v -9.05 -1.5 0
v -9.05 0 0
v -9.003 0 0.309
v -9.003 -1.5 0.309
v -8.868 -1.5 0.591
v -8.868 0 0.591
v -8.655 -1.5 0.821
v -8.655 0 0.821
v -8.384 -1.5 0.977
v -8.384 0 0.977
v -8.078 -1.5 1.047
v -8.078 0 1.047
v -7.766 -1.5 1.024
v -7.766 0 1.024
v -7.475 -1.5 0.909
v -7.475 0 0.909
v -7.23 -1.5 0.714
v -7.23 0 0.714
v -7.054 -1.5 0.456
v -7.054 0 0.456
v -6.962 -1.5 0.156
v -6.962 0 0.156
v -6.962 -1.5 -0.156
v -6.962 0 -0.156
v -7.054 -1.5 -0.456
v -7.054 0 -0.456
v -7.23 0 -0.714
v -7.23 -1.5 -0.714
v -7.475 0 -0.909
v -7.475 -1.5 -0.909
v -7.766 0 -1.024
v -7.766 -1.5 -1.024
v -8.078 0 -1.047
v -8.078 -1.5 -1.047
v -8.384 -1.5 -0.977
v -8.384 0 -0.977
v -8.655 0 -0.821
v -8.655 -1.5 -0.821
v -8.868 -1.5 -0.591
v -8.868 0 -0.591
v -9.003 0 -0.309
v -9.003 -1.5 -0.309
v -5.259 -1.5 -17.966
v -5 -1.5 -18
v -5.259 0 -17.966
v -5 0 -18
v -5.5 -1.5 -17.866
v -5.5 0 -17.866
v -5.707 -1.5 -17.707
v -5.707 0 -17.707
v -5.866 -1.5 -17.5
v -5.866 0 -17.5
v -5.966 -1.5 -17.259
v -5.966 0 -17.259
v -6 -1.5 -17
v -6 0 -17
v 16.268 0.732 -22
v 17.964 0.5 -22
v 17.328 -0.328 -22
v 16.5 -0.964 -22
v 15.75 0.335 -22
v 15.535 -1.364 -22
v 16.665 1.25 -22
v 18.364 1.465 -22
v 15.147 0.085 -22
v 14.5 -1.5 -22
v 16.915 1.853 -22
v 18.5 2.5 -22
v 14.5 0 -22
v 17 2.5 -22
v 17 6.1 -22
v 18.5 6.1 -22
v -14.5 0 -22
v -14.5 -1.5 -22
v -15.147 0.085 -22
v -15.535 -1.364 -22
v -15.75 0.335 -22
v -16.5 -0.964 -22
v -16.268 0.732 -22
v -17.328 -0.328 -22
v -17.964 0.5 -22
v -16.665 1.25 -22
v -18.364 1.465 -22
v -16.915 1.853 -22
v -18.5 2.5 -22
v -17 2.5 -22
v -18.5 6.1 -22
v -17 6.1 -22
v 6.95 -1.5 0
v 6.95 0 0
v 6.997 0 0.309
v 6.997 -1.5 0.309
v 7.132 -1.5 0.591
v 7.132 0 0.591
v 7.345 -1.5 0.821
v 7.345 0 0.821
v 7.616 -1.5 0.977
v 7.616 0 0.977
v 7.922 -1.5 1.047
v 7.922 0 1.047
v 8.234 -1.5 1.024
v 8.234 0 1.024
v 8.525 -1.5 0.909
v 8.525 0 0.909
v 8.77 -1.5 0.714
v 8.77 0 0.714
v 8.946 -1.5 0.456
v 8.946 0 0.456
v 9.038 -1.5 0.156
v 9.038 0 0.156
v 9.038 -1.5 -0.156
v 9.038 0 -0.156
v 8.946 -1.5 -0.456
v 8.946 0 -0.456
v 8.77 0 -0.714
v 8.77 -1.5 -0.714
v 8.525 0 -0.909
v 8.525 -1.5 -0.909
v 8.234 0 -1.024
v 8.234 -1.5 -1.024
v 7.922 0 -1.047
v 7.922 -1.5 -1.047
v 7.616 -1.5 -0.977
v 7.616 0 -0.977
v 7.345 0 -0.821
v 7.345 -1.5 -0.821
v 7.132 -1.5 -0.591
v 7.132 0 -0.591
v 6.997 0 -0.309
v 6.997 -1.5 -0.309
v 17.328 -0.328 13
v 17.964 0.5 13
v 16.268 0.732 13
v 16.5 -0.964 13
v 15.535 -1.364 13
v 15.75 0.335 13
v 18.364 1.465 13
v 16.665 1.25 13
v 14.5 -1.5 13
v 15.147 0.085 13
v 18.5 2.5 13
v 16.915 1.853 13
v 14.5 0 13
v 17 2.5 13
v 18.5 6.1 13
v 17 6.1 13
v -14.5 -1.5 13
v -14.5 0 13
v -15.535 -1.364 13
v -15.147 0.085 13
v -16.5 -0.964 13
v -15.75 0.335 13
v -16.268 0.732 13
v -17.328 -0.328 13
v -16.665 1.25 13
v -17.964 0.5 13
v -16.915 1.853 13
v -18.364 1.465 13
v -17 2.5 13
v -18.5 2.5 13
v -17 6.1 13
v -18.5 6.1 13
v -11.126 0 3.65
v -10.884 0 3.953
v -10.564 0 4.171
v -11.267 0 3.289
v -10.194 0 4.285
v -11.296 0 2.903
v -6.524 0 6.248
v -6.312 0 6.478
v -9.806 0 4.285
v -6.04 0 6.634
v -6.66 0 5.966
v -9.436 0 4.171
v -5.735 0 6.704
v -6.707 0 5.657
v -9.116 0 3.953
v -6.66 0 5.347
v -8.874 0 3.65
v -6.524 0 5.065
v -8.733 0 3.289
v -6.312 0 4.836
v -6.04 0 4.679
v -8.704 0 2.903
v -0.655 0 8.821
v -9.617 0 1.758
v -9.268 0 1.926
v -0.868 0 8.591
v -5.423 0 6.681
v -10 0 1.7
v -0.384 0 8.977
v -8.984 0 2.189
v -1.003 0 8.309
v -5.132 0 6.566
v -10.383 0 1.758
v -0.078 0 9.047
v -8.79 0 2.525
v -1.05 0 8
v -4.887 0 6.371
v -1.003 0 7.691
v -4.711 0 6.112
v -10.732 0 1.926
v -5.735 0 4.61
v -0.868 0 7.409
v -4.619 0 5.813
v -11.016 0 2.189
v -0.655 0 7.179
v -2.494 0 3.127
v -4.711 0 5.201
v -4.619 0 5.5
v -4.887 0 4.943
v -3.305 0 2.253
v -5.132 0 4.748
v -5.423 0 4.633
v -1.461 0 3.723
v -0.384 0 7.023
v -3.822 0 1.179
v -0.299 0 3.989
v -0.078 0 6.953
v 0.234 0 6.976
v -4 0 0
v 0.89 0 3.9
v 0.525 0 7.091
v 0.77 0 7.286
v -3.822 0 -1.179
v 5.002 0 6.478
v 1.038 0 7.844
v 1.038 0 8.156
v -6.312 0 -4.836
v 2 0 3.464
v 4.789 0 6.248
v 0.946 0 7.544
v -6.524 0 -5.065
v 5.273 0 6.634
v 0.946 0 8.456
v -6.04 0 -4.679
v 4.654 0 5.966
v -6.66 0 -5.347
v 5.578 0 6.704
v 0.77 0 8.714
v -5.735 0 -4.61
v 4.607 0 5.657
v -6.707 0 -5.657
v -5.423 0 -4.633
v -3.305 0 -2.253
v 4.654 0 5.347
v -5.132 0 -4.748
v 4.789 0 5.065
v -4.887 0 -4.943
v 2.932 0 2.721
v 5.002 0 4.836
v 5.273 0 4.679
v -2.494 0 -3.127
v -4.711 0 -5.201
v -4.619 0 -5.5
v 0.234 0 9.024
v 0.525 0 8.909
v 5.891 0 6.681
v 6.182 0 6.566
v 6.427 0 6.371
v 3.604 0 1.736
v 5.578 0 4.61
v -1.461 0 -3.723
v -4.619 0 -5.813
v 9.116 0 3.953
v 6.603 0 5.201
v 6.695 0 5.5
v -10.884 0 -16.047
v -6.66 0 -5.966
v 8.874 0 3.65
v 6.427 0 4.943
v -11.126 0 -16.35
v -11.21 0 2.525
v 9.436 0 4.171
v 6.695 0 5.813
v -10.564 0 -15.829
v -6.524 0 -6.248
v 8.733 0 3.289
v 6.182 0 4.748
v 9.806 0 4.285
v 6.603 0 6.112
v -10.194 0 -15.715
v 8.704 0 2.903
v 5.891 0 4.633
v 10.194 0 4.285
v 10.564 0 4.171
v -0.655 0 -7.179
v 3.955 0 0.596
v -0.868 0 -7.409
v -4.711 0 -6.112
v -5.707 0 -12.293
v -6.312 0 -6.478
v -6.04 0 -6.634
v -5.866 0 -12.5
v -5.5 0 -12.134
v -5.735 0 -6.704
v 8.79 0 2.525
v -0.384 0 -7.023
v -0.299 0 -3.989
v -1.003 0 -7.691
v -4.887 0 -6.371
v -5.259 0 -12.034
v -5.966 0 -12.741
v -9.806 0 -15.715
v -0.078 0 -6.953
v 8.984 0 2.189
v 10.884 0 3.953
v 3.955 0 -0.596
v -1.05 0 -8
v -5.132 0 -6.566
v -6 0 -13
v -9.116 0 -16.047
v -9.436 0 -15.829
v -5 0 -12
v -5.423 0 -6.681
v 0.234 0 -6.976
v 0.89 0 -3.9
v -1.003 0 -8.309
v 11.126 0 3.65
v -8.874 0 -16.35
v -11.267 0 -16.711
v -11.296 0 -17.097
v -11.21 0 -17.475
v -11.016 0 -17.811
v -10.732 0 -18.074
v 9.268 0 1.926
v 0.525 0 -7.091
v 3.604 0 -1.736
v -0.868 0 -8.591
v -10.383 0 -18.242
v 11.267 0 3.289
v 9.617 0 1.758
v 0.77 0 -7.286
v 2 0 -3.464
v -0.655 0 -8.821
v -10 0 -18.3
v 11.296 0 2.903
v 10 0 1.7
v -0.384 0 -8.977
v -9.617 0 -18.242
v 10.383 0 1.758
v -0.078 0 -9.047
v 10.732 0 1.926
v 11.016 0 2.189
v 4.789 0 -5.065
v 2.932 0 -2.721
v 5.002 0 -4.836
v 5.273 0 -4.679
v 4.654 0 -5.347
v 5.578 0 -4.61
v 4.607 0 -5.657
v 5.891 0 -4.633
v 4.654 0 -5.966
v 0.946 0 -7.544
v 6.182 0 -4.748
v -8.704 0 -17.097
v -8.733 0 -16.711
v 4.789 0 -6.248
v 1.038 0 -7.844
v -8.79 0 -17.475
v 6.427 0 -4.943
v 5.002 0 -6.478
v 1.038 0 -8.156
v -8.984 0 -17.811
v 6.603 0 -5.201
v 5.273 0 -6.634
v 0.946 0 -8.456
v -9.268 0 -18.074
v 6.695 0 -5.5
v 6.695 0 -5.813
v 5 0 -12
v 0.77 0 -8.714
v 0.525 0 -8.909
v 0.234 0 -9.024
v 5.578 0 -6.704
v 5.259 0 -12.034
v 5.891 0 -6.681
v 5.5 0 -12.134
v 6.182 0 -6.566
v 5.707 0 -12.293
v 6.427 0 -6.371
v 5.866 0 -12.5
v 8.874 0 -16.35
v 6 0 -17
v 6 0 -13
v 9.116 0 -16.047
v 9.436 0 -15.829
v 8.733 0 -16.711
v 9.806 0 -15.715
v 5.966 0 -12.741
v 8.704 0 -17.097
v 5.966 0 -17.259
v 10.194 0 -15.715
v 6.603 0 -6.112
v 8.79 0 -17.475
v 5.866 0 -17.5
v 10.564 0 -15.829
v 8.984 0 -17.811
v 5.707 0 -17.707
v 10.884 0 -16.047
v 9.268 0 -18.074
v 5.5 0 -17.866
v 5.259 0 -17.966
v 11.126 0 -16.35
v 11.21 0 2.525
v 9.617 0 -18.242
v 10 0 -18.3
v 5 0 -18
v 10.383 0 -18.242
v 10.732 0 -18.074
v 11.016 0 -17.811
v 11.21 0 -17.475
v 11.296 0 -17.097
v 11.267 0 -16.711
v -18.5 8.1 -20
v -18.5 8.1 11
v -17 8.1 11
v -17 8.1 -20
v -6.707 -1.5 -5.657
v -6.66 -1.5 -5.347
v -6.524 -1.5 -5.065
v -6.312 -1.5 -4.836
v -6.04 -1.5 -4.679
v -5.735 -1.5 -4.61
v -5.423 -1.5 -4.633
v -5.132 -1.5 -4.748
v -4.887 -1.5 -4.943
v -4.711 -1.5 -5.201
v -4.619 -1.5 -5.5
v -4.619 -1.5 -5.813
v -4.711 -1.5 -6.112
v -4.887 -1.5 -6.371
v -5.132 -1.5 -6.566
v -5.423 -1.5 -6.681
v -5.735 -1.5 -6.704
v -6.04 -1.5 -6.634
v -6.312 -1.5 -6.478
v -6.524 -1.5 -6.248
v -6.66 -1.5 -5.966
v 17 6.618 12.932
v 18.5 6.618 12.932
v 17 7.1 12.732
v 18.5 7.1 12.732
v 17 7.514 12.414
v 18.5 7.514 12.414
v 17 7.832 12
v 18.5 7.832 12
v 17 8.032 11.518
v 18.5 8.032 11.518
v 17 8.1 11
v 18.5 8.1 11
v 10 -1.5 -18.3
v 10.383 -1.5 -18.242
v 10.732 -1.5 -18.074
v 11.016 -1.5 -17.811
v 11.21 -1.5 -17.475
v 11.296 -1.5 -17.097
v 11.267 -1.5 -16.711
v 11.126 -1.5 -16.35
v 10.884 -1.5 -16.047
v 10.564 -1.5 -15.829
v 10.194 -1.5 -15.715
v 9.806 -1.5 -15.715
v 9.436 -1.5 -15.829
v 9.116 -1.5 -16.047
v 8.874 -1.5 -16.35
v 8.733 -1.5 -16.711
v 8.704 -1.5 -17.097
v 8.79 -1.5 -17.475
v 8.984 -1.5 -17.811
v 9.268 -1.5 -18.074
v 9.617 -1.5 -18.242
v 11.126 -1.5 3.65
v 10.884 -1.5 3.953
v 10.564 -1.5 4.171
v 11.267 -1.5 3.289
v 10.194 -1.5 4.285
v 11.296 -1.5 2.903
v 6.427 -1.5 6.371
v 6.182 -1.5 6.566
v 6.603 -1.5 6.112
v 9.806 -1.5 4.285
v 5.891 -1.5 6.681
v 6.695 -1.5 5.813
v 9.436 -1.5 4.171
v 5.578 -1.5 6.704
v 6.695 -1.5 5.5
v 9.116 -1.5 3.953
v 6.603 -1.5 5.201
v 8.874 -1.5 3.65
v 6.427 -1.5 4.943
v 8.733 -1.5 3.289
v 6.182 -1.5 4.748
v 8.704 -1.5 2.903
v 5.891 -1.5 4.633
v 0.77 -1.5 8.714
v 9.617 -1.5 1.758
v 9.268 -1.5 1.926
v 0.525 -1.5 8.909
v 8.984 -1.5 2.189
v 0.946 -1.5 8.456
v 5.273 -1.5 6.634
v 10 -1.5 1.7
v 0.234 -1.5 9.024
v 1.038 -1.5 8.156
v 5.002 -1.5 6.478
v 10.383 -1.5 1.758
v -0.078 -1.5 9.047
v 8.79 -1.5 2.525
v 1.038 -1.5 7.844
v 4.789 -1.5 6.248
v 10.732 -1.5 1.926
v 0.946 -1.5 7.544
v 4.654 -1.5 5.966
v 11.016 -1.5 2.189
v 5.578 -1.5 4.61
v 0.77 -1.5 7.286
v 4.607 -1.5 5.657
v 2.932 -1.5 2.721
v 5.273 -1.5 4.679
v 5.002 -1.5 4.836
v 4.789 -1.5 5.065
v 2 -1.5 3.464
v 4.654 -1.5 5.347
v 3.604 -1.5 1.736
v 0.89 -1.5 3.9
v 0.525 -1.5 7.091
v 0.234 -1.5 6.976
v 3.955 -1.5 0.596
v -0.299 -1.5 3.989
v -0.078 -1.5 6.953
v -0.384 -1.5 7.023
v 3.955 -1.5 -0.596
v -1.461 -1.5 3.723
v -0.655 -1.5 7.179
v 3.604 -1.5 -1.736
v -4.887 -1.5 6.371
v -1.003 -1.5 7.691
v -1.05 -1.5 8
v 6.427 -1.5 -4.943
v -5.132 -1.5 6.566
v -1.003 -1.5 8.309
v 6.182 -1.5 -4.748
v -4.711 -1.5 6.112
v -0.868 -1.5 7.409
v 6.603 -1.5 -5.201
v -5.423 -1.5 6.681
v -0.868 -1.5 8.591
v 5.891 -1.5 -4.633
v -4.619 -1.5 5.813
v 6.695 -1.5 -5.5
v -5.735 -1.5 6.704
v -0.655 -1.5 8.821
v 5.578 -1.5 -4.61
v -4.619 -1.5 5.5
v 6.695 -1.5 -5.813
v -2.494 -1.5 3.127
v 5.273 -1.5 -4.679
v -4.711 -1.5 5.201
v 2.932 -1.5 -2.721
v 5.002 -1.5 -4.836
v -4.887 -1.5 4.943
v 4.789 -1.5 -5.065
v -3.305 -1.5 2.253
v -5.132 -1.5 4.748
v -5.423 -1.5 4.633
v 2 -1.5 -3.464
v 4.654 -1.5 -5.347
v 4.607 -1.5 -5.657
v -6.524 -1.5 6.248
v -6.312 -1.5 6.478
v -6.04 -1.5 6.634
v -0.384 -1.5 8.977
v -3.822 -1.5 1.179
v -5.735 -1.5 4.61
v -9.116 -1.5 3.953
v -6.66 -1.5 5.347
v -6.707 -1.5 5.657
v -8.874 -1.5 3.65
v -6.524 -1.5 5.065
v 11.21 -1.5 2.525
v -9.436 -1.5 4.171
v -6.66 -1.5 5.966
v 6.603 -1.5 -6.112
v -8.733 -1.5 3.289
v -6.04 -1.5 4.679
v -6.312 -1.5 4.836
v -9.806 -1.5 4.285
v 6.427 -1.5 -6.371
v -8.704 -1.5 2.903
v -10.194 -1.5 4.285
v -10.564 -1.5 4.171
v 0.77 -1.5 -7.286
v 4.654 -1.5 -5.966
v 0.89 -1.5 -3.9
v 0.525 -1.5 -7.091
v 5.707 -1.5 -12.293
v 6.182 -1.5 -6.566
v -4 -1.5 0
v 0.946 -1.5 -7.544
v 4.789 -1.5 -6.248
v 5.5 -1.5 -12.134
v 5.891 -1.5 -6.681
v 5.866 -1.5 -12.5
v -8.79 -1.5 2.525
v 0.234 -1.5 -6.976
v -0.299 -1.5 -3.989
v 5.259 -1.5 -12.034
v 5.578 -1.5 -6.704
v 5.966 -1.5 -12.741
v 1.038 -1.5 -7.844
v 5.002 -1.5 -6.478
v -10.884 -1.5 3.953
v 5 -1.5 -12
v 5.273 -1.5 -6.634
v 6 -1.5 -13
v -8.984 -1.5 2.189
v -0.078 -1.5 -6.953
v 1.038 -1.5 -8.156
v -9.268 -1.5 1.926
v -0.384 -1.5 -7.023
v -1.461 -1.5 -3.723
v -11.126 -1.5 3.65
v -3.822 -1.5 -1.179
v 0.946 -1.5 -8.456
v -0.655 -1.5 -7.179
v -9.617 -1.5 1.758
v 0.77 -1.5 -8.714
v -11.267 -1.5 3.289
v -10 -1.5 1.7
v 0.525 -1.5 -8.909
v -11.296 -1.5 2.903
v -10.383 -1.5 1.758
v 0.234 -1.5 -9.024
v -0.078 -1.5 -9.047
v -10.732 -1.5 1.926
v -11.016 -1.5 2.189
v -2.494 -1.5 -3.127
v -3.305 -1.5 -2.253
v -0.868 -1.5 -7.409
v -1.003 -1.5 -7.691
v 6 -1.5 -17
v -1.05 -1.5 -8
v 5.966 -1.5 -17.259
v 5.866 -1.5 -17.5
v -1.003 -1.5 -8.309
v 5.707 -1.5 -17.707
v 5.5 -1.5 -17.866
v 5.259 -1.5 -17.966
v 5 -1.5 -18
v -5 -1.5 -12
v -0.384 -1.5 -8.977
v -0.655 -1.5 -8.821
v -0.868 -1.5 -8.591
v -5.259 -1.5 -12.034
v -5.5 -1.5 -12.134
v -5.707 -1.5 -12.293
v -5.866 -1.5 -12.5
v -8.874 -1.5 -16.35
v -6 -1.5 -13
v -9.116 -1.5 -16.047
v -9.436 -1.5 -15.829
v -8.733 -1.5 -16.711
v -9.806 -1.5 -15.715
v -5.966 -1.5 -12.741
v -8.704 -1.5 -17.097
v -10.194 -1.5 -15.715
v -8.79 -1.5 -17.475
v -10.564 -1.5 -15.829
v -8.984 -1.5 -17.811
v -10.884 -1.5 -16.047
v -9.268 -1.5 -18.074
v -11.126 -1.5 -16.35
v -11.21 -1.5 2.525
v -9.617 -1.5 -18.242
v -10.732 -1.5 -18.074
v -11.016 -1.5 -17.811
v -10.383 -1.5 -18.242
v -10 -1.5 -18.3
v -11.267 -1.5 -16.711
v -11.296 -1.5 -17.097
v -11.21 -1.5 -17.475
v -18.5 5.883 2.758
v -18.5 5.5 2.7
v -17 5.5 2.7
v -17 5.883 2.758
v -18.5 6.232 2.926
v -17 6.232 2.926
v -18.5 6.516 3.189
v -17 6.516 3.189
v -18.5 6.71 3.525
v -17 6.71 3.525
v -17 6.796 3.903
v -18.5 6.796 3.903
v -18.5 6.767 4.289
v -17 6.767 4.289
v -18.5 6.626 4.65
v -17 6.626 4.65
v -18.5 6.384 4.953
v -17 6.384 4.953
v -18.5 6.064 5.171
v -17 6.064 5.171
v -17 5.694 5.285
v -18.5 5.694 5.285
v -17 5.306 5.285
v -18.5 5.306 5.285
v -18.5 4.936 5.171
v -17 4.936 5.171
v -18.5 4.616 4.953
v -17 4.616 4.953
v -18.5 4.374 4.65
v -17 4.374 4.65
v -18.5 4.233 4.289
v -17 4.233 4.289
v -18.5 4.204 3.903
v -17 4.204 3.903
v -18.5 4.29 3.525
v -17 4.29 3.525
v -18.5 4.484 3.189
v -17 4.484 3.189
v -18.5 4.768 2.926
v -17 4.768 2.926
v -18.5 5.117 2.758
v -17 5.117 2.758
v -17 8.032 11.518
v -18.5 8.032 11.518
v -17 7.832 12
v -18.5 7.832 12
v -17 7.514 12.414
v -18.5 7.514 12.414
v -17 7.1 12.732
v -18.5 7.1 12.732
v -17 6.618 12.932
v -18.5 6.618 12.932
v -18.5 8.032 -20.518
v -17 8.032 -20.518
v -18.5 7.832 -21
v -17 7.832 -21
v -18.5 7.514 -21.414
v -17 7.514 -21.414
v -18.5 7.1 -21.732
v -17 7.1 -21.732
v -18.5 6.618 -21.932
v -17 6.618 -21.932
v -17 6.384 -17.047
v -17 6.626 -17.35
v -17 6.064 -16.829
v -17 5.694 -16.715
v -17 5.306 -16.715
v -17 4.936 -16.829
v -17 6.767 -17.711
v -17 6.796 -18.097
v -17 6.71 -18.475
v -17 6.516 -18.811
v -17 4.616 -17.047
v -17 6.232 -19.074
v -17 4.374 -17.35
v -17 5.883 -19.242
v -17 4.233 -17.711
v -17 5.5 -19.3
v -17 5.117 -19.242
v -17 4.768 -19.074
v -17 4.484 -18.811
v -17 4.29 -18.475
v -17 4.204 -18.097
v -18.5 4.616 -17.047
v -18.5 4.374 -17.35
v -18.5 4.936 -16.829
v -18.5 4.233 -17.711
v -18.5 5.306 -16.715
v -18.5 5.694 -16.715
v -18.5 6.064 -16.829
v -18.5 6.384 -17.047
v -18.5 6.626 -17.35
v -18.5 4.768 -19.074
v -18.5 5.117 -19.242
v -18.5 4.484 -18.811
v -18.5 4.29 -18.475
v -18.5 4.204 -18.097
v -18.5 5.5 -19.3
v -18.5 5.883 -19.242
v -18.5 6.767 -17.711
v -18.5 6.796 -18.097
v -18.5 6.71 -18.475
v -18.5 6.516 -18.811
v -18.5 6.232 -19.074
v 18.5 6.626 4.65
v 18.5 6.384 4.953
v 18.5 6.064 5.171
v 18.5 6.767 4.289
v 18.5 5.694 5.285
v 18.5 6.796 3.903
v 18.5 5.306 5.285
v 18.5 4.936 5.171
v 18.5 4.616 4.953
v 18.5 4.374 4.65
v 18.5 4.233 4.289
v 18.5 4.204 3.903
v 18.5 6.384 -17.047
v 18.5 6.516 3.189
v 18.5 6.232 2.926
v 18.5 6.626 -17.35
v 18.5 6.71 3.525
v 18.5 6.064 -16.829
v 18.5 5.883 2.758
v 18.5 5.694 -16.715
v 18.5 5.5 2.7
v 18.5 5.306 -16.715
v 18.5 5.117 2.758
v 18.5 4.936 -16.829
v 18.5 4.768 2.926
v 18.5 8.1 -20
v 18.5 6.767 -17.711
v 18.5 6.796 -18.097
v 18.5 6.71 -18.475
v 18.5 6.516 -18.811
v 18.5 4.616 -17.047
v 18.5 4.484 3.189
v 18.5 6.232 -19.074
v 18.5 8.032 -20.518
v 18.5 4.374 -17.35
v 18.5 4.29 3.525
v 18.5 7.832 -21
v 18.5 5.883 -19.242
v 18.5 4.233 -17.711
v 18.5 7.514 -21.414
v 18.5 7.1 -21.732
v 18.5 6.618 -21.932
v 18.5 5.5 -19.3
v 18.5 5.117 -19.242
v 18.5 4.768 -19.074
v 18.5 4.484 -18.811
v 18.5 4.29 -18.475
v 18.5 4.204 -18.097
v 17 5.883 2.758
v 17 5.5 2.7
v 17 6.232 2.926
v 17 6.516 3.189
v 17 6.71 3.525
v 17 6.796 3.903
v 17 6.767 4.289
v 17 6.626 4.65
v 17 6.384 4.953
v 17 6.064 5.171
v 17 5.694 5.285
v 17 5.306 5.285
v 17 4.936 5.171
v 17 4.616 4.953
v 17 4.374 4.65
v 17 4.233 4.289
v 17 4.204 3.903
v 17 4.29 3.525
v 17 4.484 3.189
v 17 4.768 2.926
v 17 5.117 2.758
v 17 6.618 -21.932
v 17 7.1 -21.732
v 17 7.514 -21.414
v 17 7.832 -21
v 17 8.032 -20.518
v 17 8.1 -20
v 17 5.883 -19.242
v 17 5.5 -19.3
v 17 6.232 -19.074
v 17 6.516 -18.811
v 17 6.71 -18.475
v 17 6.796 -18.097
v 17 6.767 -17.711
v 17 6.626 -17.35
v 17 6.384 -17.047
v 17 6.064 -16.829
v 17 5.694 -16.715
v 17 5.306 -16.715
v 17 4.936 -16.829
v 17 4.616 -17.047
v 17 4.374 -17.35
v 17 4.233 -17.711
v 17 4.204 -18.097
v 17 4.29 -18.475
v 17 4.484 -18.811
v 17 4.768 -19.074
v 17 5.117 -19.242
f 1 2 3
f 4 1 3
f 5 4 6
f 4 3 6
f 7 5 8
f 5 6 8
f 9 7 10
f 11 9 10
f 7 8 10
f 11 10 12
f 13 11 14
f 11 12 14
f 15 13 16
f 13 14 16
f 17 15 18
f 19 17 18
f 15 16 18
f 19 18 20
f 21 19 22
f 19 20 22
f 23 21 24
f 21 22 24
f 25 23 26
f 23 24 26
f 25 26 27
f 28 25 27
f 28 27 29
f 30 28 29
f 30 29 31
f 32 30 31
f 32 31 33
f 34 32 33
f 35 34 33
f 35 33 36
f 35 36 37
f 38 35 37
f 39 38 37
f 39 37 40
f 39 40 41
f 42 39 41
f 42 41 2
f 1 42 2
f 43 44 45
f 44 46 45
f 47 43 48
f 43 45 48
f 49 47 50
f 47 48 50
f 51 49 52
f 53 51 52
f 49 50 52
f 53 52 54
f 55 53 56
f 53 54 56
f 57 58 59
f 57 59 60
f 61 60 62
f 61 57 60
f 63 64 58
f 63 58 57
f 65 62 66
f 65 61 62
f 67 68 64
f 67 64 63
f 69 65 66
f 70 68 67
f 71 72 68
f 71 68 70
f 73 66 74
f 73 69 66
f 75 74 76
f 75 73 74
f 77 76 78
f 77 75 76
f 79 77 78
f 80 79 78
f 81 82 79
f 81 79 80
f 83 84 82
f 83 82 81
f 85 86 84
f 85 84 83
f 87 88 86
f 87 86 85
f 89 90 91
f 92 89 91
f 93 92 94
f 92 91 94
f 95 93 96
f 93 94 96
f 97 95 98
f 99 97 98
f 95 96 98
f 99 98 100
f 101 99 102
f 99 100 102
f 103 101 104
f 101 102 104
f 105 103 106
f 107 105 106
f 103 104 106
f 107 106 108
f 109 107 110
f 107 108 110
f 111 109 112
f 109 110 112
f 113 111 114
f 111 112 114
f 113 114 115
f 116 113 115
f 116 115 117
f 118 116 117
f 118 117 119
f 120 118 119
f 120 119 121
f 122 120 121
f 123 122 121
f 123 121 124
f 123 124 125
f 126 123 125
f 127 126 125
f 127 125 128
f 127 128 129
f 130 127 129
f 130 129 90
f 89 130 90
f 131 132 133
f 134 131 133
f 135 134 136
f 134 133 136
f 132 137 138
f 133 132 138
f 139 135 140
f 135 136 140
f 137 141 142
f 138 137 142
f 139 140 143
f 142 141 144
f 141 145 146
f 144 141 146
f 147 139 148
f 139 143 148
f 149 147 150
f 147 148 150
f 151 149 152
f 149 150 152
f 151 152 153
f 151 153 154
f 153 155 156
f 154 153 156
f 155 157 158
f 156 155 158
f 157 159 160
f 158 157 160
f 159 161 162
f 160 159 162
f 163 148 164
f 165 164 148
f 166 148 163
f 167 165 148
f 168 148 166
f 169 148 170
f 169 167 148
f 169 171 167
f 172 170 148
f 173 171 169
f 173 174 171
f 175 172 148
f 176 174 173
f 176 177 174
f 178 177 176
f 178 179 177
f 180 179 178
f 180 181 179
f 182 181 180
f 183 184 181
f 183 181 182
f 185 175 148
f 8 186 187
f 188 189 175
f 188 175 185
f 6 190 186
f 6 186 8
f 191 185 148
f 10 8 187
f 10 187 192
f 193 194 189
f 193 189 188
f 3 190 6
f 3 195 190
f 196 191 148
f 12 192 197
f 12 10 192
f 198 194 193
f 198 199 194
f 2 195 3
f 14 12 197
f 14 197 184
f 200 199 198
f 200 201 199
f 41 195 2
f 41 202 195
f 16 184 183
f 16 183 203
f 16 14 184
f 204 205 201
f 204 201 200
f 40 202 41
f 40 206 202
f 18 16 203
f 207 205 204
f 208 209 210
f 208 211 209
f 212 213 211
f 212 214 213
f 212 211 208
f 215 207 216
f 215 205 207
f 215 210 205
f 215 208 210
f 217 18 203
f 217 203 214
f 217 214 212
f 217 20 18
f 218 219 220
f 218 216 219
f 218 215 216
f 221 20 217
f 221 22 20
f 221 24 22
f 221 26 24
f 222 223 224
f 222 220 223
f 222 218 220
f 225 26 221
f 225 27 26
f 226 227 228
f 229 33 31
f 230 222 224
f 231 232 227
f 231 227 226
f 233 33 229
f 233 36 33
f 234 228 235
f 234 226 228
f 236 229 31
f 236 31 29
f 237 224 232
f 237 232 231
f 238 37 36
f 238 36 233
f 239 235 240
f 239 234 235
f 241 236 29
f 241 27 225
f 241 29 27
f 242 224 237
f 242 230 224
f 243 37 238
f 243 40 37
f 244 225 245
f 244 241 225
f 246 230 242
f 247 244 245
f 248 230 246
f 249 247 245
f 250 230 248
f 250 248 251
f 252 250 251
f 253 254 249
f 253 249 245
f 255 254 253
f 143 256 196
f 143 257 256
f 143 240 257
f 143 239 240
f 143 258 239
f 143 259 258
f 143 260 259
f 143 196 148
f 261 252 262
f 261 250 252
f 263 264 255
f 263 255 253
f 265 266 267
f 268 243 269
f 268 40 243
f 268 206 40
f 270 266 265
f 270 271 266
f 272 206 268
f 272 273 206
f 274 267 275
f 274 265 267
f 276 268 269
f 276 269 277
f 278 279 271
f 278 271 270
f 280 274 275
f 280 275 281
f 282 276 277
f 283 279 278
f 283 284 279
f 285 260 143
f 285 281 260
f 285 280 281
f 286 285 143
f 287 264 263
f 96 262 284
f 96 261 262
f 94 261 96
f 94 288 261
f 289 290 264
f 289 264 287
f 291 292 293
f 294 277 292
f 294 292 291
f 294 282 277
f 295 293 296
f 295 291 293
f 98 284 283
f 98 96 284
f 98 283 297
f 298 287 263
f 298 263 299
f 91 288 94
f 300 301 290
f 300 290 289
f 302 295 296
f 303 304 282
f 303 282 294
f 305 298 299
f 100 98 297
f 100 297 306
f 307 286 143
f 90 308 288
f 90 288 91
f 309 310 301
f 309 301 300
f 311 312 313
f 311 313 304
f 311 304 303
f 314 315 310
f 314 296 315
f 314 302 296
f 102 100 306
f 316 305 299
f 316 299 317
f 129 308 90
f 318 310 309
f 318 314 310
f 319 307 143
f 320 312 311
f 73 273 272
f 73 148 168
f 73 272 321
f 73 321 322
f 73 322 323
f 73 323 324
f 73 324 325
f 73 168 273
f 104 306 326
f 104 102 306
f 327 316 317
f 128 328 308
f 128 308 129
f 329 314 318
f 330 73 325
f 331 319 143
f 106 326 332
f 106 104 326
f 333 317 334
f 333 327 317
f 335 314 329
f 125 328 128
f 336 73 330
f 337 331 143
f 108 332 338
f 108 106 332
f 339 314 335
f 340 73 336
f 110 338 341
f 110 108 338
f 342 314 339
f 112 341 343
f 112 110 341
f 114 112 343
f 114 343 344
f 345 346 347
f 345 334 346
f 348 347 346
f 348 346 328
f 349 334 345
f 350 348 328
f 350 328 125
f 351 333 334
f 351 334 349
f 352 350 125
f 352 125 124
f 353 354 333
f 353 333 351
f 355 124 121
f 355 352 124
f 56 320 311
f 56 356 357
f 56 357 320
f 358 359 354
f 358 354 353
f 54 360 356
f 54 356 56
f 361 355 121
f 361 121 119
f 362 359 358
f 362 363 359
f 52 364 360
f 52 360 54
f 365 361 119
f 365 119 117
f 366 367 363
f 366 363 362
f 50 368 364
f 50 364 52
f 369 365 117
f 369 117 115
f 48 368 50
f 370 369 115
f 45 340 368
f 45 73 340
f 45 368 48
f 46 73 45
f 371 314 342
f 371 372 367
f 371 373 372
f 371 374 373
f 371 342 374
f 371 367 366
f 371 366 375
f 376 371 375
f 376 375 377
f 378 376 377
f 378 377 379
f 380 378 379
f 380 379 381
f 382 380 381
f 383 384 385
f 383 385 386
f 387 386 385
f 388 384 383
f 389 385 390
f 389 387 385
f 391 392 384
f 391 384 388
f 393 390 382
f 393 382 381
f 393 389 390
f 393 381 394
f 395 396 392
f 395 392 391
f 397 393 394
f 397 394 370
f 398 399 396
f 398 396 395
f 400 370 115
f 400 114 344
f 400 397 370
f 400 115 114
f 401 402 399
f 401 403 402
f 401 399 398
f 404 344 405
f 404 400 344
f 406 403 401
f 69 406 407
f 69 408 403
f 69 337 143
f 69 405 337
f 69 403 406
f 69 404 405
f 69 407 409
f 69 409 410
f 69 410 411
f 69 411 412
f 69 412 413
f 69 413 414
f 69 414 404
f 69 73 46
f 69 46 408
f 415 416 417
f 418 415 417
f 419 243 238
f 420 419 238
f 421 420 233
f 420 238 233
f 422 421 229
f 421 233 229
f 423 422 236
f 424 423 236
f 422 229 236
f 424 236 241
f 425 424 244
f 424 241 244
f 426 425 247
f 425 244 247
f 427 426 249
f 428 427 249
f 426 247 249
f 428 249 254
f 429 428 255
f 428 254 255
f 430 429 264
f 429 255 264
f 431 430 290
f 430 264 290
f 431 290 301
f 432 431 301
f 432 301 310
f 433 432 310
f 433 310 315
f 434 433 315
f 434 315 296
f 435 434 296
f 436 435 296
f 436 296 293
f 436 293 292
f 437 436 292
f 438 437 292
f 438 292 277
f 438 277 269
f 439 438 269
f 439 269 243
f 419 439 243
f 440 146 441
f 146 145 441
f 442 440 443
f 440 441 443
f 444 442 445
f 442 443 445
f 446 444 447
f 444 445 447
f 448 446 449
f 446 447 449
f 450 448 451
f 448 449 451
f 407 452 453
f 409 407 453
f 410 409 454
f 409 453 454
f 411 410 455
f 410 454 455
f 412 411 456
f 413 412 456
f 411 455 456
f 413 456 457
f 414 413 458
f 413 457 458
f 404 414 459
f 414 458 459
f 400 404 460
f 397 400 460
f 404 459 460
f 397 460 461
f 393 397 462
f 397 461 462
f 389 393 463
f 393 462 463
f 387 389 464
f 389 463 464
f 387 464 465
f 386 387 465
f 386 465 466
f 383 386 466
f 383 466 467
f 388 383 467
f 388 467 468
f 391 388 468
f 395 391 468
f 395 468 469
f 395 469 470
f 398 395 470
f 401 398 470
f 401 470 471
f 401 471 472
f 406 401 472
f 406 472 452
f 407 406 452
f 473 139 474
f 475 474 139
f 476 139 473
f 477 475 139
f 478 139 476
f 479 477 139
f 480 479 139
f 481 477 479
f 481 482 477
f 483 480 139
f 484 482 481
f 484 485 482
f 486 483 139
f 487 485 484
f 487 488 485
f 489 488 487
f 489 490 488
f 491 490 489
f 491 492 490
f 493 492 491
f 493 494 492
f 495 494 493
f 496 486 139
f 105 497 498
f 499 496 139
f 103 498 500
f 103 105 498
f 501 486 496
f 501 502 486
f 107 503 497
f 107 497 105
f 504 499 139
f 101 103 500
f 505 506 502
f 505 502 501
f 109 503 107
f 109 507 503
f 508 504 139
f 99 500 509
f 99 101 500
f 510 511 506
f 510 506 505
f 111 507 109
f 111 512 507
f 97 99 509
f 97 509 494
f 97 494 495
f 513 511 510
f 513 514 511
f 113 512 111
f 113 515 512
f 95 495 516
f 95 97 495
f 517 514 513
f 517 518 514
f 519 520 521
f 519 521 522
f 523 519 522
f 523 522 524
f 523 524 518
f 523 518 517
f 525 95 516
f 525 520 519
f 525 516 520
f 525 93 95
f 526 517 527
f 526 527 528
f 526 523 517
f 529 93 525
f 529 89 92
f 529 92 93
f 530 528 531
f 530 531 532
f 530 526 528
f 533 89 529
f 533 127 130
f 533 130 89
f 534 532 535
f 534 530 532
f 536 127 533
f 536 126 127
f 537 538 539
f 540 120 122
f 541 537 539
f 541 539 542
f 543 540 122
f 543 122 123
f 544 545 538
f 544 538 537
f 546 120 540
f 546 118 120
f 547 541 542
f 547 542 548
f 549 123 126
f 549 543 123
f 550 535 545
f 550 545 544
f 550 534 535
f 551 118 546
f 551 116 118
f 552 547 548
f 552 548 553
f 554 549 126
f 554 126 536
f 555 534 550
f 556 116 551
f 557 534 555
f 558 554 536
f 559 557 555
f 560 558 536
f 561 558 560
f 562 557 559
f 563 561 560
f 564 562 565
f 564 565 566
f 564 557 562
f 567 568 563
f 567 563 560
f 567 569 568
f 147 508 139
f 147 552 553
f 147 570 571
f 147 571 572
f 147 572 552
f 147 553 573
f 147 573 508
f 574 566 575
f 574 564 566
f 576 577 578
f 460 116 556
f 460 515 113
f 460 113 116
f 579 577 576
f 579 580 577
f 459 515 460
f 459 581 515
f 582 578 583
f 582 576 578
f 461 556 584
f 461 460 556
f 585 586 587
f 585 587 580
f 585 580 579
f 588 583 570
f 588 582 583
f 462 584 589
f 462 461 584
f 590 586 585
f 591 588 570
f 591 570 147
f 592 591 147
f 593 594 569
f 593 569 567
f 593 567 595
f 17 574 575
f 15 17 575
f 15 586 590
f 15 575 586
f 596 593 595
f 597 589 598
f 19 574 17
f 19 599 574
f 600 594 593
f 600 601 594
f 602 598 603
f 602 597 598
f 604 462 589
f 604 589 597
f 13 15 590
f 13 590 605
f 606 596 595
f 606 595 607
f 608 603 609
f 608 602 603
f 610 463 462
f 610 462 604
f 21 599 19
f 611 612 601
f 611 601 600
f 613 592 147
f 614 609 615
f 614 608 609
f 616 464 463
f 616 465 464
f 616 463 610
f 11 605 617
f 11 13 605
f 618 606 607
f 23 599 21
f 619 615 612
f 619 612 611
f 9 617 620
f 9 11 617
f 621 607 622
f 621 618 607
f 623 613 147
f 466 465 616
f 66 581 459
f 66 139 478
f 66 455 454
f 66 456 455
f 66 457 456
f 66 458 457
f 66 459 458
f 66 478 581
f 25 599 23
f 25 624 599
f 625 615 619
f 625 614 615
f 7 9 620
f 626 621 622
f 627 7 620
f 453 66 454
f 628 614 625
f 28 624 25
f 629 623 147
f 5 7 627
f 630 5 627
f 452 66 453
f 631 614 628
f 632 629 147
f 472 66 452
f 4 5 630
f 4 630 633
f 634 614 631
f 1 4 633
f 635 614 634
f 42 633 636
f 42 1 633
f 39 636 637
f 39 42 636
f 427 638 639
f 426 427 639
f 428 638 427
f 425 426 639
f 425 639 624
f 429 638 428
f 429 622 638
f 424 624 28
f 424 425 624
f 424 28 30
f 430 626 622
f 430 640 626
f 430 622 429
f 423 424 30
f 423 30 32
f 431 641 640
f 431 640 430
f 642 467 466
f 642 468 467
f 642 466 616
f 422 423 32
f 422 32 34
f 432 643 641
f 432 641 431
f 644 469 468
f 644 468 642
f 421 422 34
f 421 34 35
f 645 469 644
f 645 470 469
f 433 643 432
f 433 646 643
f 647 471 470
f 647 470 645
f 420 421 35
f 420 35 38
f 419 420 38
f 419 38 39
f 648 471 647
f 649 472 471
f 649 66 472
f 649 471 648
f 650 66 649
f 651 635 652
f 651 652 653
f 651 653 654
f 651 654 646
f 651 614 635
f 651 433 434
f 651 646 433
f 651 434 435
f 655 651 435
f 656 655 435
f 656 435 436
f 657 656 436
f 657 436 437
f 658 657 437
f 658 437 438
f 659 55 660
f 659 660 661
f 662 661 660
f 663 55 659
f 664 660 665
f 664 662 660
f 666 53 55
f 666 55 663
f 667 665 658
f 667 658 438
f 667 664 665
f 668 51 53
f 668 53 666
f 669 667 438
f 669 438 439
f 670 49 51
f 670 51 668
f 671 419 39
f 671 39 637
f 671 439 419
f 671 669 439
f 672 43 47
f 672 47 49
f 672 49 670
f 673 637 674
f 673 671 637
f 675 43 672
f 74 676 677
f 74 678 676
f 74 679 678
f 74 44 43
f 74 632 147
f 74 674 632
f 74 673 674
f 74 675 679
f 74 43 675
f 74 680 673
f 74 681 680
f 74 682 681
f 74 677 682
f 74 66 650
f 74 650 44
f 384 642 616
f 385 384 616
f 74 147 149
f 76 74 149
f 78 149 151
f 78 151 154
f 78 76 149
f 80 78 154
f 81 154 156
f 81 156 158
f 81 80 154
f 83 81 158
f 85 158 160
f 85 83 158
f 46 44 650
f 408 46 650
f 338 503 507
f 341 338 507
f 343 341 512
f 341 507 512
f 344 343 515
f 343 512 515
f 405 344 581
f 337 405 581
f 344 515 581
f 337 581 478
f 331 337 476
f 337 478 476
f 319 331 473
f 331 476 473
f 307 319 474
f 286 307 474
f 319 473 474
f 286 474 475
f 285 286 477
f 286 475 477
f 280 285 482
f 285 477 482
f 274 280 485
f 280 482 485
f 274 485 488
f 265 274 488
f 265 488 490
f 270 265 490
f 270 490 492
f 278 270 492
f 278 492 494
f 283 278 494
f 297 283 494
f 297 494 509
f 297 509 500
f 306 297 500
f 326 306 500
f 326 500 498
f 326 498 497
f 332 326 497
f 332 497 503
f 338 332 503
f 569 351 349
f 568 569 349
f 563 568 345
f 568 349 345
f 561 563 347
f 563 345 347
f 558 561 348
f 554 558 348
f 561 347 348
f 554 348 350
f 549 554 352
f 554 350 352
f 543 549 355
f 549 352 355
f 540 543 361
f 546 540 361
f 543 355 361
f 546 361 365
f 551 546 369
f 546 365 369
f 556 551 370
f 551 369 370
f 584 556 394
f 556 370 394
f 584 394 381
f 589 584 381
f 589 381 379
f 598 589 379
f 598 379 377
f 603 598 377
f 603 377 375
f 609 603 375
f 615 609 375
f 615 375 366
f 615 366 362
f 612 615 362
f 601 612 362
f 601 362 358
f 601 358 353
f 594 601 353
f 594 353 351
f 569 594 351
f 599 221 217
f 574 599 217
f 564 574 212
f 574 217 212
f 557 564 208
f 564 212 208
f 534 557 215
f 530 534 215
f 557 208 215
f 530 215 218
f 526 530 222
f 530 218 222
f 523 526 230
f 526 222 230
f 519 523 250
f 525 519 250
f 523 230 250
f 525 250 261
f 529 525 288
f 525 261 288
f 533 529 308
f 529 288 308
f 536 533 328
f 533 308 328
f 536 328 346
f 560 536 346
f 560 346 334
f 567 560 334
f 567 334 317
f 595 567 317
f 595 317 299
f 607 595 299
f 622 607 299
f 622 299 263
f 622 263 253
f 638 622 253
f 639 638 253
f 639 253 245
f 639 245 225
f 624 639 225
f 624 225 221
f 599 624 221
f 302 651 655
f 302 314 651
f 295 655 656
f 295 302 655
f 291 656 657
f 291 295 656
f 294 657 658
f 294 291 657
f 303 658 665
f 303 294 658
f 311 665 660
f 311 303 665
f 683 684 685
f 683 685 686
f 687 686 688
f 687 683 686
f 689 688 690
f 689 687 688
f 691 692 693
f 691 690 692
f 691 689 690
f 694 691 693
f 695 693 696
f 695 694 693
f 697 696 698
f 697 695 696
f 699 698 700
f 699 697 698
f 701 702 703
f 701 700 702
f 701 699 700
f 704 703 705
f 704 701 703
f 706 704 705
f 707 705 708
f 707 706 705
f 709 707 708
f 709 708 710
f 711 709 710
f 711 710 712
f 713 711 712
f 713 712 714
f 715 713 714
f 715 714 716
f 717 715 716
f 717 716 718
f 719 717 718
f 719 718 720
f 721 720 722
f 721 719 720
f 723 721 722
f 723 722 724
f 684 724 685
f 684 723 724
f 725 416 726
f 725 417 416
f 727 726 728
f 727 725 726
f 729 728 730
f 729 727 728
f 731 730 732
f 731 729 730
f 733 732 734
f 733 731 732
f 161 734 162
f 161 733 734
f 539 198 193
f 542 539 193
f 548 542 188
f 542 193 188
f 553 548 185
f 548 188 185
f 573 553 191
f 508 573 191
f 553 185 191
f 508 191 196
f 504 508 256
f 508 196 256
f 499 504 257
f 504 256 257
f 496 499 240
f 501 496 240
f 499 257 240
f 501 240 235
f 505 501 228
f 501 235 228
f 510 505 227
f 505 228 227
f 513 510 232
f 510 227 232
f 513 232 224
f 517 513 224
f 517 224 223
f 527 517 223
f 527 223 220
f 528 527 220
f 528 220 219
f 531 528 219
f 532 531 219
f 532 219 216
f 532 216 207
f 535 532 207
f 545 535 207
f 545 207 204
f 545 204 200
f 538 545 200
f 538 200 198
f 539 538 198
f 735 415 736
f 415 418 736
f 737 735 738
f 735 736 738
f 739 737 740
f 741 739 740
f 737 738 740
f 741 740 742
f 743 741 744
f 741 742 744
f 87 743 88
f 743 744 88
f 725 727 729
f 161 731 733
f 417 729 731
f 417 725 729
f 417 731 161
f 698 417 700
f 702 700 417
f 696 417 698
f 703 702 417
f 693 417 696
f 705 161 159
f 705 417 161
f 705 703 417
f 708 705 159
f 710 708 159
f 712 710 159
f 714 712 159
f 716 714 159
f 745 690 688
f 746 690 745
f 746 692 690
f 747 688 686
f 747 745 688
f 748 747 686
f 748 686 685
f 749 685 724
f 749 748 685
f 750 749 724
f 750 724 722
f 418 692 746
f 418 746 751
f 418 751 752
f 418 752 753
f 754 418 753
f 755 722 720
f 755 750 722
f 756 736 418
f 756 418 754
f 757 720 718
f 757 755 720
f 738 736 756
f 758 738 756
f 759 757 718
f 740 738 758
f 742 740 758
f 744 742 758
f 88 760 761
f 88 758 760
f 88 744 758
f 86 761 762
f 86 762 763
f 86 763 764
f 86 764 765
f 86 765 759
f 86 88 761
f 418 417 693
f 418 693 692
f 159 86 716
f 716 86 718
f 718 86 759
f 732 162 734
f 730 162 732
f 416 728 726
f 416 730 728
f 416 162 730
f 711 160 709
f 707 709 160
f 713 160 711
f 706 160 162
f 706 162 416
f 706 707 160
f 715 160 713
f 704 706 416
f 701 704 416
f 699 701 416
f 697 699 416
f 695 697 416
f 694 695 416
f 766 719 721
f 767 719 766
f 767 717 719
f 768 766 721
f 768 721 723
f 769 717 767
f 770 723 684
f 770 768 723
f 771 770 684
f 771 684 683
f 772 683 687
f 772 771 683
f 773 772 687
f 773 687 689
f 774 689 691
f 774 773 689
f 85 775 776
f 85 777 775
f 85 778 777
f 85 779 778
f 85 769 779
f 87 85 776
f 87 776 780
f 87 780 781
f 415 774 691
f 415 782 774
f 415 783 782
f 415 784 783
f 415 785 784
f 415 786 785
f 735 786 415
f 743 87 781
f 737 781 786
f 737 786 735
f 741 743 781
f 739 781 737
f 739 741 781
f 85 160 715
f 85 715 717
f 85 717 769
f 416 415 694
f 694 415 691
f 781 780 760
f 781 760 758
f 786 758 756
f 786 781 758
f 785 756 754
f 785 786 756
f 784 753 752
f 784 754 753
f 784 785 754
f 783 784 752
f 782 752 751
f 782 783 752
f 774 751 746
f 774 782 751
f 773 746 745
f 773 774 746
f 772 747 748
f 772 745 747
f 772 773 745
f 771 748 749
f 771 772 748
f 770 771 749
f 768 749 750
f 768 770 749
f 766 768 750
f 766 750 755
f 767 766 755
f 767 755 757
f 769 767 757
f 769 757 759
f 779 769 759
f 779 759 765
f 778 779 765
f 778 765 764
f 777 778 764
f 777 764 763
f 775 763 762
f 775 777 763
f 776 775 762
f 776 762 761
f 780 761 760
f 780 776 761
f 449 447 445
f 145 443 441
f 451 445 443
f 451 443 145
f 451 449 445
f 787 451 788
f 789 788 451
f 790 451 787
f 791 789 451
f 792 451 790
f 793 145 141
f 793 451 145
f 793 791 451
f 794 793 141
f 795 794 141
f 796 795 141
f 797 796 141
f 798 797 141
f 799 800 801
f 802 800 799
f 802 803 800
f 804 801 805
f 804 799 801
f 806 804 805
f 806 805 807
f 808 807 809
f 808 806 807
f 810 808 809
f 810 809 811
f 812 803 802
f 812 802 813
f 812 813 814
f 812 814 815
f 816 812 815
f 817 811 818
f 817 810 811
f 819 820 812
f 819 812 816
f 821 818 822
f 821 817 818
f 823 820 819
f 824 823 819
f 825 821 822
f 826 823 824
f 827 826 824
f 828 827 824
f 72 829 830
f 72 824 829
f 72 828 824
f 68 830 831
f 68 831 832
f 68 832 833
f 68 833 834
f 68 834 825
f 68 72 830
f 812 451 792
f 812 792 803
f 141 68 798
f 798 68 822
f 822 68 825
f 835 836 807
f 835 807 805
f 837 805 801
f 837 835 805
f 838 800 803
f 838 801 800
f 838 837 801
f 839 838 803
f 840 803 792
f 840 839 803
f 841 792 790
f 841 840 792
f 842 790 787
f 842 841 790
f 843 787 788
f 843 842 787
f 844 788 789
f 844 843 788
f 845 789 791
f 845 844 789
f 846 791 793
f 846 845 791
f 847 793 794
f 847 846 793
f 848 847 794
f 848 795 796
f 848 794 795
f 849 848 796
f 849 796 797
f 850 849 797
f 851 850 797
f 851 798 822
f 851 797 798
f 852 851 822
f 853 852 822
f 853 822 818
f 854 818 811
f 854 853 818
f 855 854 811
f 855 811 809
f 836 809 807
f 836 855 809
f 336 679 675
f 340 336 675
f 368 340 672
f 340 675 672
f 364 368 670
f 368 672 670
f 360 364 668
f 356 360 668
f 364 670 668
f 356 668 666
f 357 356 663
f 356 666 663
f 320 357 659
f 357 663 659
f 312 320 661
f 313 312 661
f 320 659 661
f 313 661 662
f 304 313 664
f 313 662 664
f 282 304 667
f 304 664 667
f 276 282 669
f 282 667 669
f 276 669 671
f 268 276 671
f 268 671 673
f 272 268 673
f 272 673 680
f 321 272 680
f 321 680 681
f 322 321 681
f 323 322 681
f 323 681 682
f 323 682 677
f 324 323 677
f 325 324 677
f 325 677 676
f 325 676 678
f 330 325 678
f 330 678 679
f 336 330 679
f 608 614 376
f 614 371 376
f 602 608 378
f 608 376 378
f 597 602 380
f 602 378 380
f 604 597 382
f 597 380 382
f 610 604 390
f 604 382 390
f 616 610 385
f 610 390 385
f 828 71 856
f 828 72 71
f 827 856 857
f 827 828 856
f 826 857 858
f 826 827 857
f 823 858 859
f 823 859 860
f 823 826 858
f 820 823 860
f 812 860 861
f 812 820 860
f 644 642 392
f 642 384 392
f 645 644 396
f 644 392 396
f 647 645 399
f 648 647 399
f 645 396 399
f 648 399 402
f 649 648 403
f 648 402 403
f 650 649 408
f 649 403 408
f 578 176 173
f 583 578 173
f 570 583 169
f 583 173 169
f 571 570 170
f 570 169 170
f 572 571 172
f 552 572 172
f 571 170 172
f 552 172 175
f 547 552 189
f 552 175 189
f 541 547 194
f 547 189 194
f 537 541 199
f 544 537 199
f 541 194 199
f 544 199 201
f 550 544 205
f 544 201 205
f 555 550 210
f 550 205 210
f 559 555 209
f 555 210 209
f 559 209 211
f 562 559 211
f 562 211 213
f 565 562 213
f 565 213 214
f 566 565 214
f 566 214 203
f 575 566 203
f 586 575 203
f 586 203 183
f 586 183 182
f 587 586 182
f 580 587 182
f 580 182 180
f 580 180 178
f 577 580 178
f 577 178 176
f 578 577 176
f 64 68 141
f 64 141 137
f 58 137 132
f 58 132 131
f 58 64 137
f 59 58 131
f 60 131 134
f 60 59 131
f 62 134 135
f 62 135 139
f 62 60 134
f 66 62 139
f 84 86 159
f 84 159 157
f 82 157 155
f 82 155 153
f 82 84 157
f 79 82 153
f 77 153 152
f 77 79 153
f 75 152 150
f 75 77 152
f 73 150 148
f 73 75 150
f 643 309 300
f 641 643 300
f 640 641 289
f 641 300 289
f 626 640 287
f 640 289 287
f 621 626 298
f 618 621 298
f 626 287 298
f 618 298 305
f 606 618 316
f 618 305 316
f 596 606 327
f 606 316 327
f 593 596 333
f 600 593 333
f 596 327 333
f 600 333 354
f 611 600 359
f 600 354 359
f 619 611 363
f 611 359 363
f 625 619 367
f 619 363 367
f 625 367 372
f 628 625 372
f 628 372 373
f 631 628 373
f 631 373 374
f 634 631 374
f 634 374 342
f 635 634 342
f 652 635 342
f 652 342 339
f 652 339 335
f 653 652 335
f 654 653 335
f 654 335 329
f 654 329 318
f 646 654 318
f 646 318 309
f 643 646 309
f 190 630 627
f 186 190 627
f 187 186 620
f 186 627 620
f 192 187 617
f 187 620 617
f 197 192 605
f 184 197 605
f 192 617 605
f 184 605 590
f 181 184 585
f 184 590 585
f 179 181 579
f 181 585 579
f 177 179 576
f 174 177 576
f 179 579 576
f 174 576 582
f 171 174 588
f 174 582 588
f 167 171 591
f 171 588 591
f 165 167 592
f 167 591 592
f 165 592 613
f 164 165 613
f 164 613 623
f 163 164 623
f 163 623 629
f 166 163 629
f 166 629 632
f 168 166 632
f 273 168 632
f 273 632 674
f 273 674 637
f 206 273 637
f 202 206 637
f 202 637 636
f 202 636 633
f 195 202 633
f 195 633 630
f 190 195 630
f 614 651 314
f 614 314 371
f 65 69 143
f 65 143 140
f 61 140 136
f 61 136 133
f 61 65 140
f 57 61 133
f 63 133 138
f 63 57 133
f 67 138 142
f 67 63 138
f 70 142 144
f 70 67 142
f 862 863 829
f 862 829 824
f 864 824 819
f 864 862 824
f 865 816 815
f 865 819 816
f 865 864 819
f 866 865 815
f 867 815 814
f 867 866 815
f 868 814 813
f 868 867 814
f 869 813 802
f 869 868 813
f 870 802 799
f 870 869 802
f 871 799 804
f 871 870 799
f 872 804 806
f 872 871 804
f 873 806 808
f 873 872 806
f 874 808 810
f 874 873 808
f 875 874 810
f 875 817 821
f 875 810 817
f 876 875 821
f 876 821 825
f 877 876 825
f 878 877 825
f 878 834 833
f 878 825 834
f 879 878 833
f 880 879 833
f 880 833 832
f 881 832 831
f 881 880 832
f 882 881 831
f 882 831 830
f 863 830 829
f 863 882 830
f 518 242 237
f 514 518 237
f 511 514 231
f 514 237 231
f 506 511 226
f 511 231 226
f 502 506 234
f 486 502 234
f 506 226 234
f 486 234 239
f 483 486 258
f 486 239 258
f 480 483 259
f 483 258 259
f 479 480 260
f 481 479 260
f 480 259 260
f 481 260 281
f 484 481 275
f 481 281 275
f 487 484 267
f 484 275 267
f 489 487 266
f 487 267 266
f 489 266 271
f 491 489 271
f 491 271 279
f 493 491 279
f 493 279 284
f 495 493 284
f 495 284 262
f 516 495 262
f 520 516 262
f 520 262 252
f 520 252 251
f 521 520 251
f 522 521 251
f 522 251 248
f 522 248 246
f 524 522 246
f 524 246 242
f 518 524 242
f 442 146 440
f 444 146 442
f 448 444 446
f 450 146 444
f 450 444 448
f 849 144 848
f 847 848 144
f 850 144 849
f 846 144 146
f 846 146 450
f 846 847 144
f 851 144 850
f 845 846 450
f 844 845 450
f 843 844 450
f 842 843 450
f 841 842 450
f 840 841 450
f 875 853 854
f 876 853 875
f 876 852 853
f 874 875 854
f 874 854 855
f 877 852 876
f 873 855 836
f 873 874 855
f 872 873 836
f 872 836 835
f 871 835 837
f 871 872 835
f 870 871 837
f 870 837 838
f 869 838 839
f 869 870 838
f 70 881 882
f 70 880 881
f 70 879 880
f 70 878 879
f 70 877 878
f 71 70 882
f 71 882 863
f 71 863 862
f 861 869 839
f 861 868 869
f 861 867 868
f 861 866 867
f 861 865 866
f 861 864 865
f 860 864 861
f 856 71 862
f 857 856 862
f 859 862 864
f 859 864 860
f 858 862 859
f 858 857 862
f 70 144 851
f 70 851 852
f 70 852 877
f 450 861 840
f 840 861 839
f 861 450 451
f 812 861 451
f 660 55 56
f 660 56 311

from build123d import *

# Parameters (mm, degrees)
BASE_FLANGE1_DEPTH      = 13
BASE_FLANGE1_DEPTH_BACK = 22
SKETCH5_R               = 4
SKETCH5_R_2             = 1.05
CUT_EXTRUDE1_DEPTH      = 10
CUT_EXTRUDE2_DEPTH      = 30.864025181
CUT_EXTRUDE2_DEPTH_BACK = 30.864025181
SKETCH7_R               = 1.3
FILLET1_R               = 2
SKETCH8_R               = 1.3
CUT_EXTRUDE3_DEPTH      = 10
SKETCH9_W               = 12
SKETCH9_H               = 6
CUT_EXTRUDE4_DEPTH      = 10
FILLET2_R               = 1


# Sheet-metal steps are written as plain solids
with BuildPart() as part:
    # Sketch1 → Base-Flange1 (new, two sides: drawn at the far end of the back side and taken through both)
    with BuildSketch(Plane.XY.offset(-BASE_FLANGE1_DEPTH_BACK)):
        with BuildLine():
            Line((-17, 8.1), (-17, 2.5))
            ThreePointArc((-17, 2.5), (-16.267766953, 0.732233047), (-14.5, 0))
            Line((-14.5, 0), (14.5, 0))
            ThreePointArc((14.5, 0), (16.267766953, 0.732233047), (17, 2.5))
            Line((17, 2.5), (17, 8.1))
            Line((17, 8.1), (18.5, 8.1))
            Line((18.5, 8.1), (18.5, 2.5))
            ThreePointArc((18.5, 2.5), (17.328427125, -0.328427125), (14.5, -1.5))
            Line((14.5, -1.5), (-14.5, -1.5))
            ThreePointArc((-14.5, -1.5), (-17.328427125, -0.328427125), (-18.5, 2.5))
            Line((-18.5, 2.5), (-18.5, 8.1))
            Line((-18.5, 8.1), (-17, 8.1))
        make_face()
    extrude(amount=BASE_FLANGE1_DEPTH + BASE_FLANGE1_DEPTH_BACK)

    # Sketch5 → Cut-Extrude1 (cut)
    with BuildSketch(Plane(origin=(0, 0, 0), x_dir=(1, 0, 0), z_dir=(0, 1, 0))):
        with Locations(Location((0, 0, 0), (0, 0, 180))):
            Circle(SKETCH5_R)
        with Locations(Location((0, 8, 0), (0, 0, 180))):
            Circle(SKETCH5_R_2)
        with Locations(Location((5.656854249, 5.656854249, 0), (0, 0, 180))):
            Circle(SKETCH5_R_2)
        with Locations(Location((8, 0, 0), (0, 0, 180))):
            Circle(SKETCH5_R_2)
        with Locations(Location((5.656854249, -5.656854249, 0), (0, 0, 180))):
            Circle(SKETCH5_R_2)
        with Locations(Location((0, -8, 0), (0, 0, 180))):
            Circle(SKETCH5_R_2)
        with Locations(Location((-5.656854249, -5.656854249, 0), (0, 0, 180))):
            Circle(SKETCH5_R_2)
        with Locations(Location((-8, 0, 0), (0, 0, 180))):
            Circle(SKETCH5_R_2)
        with Locations(Location((-5.656854249, 5.656854249, 0), (0, 0, 180))):
            Circle(SKETCH5_R_2)
    extrude(amount=-CUT_EXTRUDE1_DEPTH, mode=Mode.SUBTRACT)

    # Sketch7 → Cut-Extrude2 (cut, two sides: drawn at the far end of the back side and taken through both)
    with BuildSketch(Plane(origin=(0, 0, 0), x_dir=(0, 0, -1), z_dir=(1, 0, 0)).offset(-CUT_EXTRUDE2_DEPTH_BACK)):
        with Locations((-4, 5.5)):
            Circle(SKETCH7_R)
        with Locations((18, 5.5)):
            Circle(SKETCH7_R)
    extrude(amount=CUT_EXTRUDE2_DEPTH + CUT_EXTRUDE2_DEPTH_BACK, mode=Mode.SUBTRACT)

    # Fillet1
    fillet1_edges = [part.edges().sort_by_distance(p)[0] for p in [
        (-17.75, 8.1, 13),
        (-17.75, 8.1, -22),
        (17.75, 8.1, -22),
        (17.75, 8.1, 13),
    ]]
    fillet(fillet1_edges, radius=FILLET1_R)

    # Sketch8 → Cut-Extrude3 (cut)
    with BuildSketch(Plane.XZ.offset(1.5)):
        with Locations(Location((-10, 3, 0), (0, 0, 270))):
            Circle(SKETCH8_R)
        with Locations(Location((10, 3, 0), (0, 0, 270))):
            Circle(SKETCH8_R)
        with Locations(Location((10, -17, 0), (0, 0, 270))):
            Circle(SKETCH8_R)
        with Locations(Location((-10, -17, 0), (0, 0, 270))):
            Circle(SKETCH8_R)
    extrude(amount=-CUT_EXTRUDE3_DEPTH, mode=Mode.SUBTRACT)

    # Sketch9 → Cut-Extrude4 (cut)
    with BuildSketch(Plane.XZ.offset(1.5)):
        with Locations((0, -15)):
            Rectangle(SKETCH9_W, SKETCH9_H)
    extrude(amount=-CUT_EXTRUDE4_DEPTH, mode=Mode.SUBTRACT)

    # Fillet2
    fillet2_edges = [part.edges().sort_by_distance(p)[0] for p in [
        (6, -0.75, -12),
        (6, -0.75, -18),
        (-6, -0.75, -18),
        (-6, -0.75, -12),
    ]]
    fillet(fillet2_edges, radius=FILLET2_R)


solid = part.part
